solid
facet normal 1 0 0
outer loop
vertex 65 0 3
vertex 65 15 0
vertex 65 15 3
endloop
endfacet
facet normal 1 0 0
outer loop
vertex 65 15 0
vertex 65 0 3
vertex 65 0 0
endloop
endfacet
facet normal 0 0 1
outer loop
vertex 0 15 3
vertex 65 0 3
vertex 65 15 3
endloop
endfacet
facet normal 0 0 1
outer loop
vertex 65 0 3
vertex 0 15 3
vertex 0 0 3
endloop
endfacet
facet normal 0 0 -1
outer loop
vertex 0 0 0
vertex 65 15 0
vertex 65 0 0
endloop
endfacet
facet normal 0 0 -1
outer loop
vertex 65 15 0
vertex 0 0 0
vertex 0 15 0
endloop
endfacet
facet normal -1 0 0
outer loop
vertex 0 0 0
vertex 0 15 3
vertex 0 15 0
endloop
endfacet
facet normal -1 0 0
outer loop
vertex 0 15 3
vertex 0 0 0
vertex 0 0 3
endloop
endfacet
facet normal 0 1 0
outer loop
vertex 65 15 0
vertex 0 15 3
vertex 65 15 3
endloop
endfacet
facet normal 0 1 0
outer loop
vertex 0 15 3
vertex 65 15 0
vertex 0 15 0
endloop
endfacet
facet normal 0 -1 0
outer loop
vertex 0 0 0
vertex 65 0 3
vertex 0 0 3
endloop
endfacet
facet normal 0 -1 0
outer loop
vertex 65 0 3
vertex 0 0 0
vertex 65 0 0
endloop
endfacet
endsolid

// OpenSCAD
difference(){
	union(){ 
        translate([0,0,0]){
           cube([65,15,3], center=false);
        }                
	}
	union() {

	}
}
